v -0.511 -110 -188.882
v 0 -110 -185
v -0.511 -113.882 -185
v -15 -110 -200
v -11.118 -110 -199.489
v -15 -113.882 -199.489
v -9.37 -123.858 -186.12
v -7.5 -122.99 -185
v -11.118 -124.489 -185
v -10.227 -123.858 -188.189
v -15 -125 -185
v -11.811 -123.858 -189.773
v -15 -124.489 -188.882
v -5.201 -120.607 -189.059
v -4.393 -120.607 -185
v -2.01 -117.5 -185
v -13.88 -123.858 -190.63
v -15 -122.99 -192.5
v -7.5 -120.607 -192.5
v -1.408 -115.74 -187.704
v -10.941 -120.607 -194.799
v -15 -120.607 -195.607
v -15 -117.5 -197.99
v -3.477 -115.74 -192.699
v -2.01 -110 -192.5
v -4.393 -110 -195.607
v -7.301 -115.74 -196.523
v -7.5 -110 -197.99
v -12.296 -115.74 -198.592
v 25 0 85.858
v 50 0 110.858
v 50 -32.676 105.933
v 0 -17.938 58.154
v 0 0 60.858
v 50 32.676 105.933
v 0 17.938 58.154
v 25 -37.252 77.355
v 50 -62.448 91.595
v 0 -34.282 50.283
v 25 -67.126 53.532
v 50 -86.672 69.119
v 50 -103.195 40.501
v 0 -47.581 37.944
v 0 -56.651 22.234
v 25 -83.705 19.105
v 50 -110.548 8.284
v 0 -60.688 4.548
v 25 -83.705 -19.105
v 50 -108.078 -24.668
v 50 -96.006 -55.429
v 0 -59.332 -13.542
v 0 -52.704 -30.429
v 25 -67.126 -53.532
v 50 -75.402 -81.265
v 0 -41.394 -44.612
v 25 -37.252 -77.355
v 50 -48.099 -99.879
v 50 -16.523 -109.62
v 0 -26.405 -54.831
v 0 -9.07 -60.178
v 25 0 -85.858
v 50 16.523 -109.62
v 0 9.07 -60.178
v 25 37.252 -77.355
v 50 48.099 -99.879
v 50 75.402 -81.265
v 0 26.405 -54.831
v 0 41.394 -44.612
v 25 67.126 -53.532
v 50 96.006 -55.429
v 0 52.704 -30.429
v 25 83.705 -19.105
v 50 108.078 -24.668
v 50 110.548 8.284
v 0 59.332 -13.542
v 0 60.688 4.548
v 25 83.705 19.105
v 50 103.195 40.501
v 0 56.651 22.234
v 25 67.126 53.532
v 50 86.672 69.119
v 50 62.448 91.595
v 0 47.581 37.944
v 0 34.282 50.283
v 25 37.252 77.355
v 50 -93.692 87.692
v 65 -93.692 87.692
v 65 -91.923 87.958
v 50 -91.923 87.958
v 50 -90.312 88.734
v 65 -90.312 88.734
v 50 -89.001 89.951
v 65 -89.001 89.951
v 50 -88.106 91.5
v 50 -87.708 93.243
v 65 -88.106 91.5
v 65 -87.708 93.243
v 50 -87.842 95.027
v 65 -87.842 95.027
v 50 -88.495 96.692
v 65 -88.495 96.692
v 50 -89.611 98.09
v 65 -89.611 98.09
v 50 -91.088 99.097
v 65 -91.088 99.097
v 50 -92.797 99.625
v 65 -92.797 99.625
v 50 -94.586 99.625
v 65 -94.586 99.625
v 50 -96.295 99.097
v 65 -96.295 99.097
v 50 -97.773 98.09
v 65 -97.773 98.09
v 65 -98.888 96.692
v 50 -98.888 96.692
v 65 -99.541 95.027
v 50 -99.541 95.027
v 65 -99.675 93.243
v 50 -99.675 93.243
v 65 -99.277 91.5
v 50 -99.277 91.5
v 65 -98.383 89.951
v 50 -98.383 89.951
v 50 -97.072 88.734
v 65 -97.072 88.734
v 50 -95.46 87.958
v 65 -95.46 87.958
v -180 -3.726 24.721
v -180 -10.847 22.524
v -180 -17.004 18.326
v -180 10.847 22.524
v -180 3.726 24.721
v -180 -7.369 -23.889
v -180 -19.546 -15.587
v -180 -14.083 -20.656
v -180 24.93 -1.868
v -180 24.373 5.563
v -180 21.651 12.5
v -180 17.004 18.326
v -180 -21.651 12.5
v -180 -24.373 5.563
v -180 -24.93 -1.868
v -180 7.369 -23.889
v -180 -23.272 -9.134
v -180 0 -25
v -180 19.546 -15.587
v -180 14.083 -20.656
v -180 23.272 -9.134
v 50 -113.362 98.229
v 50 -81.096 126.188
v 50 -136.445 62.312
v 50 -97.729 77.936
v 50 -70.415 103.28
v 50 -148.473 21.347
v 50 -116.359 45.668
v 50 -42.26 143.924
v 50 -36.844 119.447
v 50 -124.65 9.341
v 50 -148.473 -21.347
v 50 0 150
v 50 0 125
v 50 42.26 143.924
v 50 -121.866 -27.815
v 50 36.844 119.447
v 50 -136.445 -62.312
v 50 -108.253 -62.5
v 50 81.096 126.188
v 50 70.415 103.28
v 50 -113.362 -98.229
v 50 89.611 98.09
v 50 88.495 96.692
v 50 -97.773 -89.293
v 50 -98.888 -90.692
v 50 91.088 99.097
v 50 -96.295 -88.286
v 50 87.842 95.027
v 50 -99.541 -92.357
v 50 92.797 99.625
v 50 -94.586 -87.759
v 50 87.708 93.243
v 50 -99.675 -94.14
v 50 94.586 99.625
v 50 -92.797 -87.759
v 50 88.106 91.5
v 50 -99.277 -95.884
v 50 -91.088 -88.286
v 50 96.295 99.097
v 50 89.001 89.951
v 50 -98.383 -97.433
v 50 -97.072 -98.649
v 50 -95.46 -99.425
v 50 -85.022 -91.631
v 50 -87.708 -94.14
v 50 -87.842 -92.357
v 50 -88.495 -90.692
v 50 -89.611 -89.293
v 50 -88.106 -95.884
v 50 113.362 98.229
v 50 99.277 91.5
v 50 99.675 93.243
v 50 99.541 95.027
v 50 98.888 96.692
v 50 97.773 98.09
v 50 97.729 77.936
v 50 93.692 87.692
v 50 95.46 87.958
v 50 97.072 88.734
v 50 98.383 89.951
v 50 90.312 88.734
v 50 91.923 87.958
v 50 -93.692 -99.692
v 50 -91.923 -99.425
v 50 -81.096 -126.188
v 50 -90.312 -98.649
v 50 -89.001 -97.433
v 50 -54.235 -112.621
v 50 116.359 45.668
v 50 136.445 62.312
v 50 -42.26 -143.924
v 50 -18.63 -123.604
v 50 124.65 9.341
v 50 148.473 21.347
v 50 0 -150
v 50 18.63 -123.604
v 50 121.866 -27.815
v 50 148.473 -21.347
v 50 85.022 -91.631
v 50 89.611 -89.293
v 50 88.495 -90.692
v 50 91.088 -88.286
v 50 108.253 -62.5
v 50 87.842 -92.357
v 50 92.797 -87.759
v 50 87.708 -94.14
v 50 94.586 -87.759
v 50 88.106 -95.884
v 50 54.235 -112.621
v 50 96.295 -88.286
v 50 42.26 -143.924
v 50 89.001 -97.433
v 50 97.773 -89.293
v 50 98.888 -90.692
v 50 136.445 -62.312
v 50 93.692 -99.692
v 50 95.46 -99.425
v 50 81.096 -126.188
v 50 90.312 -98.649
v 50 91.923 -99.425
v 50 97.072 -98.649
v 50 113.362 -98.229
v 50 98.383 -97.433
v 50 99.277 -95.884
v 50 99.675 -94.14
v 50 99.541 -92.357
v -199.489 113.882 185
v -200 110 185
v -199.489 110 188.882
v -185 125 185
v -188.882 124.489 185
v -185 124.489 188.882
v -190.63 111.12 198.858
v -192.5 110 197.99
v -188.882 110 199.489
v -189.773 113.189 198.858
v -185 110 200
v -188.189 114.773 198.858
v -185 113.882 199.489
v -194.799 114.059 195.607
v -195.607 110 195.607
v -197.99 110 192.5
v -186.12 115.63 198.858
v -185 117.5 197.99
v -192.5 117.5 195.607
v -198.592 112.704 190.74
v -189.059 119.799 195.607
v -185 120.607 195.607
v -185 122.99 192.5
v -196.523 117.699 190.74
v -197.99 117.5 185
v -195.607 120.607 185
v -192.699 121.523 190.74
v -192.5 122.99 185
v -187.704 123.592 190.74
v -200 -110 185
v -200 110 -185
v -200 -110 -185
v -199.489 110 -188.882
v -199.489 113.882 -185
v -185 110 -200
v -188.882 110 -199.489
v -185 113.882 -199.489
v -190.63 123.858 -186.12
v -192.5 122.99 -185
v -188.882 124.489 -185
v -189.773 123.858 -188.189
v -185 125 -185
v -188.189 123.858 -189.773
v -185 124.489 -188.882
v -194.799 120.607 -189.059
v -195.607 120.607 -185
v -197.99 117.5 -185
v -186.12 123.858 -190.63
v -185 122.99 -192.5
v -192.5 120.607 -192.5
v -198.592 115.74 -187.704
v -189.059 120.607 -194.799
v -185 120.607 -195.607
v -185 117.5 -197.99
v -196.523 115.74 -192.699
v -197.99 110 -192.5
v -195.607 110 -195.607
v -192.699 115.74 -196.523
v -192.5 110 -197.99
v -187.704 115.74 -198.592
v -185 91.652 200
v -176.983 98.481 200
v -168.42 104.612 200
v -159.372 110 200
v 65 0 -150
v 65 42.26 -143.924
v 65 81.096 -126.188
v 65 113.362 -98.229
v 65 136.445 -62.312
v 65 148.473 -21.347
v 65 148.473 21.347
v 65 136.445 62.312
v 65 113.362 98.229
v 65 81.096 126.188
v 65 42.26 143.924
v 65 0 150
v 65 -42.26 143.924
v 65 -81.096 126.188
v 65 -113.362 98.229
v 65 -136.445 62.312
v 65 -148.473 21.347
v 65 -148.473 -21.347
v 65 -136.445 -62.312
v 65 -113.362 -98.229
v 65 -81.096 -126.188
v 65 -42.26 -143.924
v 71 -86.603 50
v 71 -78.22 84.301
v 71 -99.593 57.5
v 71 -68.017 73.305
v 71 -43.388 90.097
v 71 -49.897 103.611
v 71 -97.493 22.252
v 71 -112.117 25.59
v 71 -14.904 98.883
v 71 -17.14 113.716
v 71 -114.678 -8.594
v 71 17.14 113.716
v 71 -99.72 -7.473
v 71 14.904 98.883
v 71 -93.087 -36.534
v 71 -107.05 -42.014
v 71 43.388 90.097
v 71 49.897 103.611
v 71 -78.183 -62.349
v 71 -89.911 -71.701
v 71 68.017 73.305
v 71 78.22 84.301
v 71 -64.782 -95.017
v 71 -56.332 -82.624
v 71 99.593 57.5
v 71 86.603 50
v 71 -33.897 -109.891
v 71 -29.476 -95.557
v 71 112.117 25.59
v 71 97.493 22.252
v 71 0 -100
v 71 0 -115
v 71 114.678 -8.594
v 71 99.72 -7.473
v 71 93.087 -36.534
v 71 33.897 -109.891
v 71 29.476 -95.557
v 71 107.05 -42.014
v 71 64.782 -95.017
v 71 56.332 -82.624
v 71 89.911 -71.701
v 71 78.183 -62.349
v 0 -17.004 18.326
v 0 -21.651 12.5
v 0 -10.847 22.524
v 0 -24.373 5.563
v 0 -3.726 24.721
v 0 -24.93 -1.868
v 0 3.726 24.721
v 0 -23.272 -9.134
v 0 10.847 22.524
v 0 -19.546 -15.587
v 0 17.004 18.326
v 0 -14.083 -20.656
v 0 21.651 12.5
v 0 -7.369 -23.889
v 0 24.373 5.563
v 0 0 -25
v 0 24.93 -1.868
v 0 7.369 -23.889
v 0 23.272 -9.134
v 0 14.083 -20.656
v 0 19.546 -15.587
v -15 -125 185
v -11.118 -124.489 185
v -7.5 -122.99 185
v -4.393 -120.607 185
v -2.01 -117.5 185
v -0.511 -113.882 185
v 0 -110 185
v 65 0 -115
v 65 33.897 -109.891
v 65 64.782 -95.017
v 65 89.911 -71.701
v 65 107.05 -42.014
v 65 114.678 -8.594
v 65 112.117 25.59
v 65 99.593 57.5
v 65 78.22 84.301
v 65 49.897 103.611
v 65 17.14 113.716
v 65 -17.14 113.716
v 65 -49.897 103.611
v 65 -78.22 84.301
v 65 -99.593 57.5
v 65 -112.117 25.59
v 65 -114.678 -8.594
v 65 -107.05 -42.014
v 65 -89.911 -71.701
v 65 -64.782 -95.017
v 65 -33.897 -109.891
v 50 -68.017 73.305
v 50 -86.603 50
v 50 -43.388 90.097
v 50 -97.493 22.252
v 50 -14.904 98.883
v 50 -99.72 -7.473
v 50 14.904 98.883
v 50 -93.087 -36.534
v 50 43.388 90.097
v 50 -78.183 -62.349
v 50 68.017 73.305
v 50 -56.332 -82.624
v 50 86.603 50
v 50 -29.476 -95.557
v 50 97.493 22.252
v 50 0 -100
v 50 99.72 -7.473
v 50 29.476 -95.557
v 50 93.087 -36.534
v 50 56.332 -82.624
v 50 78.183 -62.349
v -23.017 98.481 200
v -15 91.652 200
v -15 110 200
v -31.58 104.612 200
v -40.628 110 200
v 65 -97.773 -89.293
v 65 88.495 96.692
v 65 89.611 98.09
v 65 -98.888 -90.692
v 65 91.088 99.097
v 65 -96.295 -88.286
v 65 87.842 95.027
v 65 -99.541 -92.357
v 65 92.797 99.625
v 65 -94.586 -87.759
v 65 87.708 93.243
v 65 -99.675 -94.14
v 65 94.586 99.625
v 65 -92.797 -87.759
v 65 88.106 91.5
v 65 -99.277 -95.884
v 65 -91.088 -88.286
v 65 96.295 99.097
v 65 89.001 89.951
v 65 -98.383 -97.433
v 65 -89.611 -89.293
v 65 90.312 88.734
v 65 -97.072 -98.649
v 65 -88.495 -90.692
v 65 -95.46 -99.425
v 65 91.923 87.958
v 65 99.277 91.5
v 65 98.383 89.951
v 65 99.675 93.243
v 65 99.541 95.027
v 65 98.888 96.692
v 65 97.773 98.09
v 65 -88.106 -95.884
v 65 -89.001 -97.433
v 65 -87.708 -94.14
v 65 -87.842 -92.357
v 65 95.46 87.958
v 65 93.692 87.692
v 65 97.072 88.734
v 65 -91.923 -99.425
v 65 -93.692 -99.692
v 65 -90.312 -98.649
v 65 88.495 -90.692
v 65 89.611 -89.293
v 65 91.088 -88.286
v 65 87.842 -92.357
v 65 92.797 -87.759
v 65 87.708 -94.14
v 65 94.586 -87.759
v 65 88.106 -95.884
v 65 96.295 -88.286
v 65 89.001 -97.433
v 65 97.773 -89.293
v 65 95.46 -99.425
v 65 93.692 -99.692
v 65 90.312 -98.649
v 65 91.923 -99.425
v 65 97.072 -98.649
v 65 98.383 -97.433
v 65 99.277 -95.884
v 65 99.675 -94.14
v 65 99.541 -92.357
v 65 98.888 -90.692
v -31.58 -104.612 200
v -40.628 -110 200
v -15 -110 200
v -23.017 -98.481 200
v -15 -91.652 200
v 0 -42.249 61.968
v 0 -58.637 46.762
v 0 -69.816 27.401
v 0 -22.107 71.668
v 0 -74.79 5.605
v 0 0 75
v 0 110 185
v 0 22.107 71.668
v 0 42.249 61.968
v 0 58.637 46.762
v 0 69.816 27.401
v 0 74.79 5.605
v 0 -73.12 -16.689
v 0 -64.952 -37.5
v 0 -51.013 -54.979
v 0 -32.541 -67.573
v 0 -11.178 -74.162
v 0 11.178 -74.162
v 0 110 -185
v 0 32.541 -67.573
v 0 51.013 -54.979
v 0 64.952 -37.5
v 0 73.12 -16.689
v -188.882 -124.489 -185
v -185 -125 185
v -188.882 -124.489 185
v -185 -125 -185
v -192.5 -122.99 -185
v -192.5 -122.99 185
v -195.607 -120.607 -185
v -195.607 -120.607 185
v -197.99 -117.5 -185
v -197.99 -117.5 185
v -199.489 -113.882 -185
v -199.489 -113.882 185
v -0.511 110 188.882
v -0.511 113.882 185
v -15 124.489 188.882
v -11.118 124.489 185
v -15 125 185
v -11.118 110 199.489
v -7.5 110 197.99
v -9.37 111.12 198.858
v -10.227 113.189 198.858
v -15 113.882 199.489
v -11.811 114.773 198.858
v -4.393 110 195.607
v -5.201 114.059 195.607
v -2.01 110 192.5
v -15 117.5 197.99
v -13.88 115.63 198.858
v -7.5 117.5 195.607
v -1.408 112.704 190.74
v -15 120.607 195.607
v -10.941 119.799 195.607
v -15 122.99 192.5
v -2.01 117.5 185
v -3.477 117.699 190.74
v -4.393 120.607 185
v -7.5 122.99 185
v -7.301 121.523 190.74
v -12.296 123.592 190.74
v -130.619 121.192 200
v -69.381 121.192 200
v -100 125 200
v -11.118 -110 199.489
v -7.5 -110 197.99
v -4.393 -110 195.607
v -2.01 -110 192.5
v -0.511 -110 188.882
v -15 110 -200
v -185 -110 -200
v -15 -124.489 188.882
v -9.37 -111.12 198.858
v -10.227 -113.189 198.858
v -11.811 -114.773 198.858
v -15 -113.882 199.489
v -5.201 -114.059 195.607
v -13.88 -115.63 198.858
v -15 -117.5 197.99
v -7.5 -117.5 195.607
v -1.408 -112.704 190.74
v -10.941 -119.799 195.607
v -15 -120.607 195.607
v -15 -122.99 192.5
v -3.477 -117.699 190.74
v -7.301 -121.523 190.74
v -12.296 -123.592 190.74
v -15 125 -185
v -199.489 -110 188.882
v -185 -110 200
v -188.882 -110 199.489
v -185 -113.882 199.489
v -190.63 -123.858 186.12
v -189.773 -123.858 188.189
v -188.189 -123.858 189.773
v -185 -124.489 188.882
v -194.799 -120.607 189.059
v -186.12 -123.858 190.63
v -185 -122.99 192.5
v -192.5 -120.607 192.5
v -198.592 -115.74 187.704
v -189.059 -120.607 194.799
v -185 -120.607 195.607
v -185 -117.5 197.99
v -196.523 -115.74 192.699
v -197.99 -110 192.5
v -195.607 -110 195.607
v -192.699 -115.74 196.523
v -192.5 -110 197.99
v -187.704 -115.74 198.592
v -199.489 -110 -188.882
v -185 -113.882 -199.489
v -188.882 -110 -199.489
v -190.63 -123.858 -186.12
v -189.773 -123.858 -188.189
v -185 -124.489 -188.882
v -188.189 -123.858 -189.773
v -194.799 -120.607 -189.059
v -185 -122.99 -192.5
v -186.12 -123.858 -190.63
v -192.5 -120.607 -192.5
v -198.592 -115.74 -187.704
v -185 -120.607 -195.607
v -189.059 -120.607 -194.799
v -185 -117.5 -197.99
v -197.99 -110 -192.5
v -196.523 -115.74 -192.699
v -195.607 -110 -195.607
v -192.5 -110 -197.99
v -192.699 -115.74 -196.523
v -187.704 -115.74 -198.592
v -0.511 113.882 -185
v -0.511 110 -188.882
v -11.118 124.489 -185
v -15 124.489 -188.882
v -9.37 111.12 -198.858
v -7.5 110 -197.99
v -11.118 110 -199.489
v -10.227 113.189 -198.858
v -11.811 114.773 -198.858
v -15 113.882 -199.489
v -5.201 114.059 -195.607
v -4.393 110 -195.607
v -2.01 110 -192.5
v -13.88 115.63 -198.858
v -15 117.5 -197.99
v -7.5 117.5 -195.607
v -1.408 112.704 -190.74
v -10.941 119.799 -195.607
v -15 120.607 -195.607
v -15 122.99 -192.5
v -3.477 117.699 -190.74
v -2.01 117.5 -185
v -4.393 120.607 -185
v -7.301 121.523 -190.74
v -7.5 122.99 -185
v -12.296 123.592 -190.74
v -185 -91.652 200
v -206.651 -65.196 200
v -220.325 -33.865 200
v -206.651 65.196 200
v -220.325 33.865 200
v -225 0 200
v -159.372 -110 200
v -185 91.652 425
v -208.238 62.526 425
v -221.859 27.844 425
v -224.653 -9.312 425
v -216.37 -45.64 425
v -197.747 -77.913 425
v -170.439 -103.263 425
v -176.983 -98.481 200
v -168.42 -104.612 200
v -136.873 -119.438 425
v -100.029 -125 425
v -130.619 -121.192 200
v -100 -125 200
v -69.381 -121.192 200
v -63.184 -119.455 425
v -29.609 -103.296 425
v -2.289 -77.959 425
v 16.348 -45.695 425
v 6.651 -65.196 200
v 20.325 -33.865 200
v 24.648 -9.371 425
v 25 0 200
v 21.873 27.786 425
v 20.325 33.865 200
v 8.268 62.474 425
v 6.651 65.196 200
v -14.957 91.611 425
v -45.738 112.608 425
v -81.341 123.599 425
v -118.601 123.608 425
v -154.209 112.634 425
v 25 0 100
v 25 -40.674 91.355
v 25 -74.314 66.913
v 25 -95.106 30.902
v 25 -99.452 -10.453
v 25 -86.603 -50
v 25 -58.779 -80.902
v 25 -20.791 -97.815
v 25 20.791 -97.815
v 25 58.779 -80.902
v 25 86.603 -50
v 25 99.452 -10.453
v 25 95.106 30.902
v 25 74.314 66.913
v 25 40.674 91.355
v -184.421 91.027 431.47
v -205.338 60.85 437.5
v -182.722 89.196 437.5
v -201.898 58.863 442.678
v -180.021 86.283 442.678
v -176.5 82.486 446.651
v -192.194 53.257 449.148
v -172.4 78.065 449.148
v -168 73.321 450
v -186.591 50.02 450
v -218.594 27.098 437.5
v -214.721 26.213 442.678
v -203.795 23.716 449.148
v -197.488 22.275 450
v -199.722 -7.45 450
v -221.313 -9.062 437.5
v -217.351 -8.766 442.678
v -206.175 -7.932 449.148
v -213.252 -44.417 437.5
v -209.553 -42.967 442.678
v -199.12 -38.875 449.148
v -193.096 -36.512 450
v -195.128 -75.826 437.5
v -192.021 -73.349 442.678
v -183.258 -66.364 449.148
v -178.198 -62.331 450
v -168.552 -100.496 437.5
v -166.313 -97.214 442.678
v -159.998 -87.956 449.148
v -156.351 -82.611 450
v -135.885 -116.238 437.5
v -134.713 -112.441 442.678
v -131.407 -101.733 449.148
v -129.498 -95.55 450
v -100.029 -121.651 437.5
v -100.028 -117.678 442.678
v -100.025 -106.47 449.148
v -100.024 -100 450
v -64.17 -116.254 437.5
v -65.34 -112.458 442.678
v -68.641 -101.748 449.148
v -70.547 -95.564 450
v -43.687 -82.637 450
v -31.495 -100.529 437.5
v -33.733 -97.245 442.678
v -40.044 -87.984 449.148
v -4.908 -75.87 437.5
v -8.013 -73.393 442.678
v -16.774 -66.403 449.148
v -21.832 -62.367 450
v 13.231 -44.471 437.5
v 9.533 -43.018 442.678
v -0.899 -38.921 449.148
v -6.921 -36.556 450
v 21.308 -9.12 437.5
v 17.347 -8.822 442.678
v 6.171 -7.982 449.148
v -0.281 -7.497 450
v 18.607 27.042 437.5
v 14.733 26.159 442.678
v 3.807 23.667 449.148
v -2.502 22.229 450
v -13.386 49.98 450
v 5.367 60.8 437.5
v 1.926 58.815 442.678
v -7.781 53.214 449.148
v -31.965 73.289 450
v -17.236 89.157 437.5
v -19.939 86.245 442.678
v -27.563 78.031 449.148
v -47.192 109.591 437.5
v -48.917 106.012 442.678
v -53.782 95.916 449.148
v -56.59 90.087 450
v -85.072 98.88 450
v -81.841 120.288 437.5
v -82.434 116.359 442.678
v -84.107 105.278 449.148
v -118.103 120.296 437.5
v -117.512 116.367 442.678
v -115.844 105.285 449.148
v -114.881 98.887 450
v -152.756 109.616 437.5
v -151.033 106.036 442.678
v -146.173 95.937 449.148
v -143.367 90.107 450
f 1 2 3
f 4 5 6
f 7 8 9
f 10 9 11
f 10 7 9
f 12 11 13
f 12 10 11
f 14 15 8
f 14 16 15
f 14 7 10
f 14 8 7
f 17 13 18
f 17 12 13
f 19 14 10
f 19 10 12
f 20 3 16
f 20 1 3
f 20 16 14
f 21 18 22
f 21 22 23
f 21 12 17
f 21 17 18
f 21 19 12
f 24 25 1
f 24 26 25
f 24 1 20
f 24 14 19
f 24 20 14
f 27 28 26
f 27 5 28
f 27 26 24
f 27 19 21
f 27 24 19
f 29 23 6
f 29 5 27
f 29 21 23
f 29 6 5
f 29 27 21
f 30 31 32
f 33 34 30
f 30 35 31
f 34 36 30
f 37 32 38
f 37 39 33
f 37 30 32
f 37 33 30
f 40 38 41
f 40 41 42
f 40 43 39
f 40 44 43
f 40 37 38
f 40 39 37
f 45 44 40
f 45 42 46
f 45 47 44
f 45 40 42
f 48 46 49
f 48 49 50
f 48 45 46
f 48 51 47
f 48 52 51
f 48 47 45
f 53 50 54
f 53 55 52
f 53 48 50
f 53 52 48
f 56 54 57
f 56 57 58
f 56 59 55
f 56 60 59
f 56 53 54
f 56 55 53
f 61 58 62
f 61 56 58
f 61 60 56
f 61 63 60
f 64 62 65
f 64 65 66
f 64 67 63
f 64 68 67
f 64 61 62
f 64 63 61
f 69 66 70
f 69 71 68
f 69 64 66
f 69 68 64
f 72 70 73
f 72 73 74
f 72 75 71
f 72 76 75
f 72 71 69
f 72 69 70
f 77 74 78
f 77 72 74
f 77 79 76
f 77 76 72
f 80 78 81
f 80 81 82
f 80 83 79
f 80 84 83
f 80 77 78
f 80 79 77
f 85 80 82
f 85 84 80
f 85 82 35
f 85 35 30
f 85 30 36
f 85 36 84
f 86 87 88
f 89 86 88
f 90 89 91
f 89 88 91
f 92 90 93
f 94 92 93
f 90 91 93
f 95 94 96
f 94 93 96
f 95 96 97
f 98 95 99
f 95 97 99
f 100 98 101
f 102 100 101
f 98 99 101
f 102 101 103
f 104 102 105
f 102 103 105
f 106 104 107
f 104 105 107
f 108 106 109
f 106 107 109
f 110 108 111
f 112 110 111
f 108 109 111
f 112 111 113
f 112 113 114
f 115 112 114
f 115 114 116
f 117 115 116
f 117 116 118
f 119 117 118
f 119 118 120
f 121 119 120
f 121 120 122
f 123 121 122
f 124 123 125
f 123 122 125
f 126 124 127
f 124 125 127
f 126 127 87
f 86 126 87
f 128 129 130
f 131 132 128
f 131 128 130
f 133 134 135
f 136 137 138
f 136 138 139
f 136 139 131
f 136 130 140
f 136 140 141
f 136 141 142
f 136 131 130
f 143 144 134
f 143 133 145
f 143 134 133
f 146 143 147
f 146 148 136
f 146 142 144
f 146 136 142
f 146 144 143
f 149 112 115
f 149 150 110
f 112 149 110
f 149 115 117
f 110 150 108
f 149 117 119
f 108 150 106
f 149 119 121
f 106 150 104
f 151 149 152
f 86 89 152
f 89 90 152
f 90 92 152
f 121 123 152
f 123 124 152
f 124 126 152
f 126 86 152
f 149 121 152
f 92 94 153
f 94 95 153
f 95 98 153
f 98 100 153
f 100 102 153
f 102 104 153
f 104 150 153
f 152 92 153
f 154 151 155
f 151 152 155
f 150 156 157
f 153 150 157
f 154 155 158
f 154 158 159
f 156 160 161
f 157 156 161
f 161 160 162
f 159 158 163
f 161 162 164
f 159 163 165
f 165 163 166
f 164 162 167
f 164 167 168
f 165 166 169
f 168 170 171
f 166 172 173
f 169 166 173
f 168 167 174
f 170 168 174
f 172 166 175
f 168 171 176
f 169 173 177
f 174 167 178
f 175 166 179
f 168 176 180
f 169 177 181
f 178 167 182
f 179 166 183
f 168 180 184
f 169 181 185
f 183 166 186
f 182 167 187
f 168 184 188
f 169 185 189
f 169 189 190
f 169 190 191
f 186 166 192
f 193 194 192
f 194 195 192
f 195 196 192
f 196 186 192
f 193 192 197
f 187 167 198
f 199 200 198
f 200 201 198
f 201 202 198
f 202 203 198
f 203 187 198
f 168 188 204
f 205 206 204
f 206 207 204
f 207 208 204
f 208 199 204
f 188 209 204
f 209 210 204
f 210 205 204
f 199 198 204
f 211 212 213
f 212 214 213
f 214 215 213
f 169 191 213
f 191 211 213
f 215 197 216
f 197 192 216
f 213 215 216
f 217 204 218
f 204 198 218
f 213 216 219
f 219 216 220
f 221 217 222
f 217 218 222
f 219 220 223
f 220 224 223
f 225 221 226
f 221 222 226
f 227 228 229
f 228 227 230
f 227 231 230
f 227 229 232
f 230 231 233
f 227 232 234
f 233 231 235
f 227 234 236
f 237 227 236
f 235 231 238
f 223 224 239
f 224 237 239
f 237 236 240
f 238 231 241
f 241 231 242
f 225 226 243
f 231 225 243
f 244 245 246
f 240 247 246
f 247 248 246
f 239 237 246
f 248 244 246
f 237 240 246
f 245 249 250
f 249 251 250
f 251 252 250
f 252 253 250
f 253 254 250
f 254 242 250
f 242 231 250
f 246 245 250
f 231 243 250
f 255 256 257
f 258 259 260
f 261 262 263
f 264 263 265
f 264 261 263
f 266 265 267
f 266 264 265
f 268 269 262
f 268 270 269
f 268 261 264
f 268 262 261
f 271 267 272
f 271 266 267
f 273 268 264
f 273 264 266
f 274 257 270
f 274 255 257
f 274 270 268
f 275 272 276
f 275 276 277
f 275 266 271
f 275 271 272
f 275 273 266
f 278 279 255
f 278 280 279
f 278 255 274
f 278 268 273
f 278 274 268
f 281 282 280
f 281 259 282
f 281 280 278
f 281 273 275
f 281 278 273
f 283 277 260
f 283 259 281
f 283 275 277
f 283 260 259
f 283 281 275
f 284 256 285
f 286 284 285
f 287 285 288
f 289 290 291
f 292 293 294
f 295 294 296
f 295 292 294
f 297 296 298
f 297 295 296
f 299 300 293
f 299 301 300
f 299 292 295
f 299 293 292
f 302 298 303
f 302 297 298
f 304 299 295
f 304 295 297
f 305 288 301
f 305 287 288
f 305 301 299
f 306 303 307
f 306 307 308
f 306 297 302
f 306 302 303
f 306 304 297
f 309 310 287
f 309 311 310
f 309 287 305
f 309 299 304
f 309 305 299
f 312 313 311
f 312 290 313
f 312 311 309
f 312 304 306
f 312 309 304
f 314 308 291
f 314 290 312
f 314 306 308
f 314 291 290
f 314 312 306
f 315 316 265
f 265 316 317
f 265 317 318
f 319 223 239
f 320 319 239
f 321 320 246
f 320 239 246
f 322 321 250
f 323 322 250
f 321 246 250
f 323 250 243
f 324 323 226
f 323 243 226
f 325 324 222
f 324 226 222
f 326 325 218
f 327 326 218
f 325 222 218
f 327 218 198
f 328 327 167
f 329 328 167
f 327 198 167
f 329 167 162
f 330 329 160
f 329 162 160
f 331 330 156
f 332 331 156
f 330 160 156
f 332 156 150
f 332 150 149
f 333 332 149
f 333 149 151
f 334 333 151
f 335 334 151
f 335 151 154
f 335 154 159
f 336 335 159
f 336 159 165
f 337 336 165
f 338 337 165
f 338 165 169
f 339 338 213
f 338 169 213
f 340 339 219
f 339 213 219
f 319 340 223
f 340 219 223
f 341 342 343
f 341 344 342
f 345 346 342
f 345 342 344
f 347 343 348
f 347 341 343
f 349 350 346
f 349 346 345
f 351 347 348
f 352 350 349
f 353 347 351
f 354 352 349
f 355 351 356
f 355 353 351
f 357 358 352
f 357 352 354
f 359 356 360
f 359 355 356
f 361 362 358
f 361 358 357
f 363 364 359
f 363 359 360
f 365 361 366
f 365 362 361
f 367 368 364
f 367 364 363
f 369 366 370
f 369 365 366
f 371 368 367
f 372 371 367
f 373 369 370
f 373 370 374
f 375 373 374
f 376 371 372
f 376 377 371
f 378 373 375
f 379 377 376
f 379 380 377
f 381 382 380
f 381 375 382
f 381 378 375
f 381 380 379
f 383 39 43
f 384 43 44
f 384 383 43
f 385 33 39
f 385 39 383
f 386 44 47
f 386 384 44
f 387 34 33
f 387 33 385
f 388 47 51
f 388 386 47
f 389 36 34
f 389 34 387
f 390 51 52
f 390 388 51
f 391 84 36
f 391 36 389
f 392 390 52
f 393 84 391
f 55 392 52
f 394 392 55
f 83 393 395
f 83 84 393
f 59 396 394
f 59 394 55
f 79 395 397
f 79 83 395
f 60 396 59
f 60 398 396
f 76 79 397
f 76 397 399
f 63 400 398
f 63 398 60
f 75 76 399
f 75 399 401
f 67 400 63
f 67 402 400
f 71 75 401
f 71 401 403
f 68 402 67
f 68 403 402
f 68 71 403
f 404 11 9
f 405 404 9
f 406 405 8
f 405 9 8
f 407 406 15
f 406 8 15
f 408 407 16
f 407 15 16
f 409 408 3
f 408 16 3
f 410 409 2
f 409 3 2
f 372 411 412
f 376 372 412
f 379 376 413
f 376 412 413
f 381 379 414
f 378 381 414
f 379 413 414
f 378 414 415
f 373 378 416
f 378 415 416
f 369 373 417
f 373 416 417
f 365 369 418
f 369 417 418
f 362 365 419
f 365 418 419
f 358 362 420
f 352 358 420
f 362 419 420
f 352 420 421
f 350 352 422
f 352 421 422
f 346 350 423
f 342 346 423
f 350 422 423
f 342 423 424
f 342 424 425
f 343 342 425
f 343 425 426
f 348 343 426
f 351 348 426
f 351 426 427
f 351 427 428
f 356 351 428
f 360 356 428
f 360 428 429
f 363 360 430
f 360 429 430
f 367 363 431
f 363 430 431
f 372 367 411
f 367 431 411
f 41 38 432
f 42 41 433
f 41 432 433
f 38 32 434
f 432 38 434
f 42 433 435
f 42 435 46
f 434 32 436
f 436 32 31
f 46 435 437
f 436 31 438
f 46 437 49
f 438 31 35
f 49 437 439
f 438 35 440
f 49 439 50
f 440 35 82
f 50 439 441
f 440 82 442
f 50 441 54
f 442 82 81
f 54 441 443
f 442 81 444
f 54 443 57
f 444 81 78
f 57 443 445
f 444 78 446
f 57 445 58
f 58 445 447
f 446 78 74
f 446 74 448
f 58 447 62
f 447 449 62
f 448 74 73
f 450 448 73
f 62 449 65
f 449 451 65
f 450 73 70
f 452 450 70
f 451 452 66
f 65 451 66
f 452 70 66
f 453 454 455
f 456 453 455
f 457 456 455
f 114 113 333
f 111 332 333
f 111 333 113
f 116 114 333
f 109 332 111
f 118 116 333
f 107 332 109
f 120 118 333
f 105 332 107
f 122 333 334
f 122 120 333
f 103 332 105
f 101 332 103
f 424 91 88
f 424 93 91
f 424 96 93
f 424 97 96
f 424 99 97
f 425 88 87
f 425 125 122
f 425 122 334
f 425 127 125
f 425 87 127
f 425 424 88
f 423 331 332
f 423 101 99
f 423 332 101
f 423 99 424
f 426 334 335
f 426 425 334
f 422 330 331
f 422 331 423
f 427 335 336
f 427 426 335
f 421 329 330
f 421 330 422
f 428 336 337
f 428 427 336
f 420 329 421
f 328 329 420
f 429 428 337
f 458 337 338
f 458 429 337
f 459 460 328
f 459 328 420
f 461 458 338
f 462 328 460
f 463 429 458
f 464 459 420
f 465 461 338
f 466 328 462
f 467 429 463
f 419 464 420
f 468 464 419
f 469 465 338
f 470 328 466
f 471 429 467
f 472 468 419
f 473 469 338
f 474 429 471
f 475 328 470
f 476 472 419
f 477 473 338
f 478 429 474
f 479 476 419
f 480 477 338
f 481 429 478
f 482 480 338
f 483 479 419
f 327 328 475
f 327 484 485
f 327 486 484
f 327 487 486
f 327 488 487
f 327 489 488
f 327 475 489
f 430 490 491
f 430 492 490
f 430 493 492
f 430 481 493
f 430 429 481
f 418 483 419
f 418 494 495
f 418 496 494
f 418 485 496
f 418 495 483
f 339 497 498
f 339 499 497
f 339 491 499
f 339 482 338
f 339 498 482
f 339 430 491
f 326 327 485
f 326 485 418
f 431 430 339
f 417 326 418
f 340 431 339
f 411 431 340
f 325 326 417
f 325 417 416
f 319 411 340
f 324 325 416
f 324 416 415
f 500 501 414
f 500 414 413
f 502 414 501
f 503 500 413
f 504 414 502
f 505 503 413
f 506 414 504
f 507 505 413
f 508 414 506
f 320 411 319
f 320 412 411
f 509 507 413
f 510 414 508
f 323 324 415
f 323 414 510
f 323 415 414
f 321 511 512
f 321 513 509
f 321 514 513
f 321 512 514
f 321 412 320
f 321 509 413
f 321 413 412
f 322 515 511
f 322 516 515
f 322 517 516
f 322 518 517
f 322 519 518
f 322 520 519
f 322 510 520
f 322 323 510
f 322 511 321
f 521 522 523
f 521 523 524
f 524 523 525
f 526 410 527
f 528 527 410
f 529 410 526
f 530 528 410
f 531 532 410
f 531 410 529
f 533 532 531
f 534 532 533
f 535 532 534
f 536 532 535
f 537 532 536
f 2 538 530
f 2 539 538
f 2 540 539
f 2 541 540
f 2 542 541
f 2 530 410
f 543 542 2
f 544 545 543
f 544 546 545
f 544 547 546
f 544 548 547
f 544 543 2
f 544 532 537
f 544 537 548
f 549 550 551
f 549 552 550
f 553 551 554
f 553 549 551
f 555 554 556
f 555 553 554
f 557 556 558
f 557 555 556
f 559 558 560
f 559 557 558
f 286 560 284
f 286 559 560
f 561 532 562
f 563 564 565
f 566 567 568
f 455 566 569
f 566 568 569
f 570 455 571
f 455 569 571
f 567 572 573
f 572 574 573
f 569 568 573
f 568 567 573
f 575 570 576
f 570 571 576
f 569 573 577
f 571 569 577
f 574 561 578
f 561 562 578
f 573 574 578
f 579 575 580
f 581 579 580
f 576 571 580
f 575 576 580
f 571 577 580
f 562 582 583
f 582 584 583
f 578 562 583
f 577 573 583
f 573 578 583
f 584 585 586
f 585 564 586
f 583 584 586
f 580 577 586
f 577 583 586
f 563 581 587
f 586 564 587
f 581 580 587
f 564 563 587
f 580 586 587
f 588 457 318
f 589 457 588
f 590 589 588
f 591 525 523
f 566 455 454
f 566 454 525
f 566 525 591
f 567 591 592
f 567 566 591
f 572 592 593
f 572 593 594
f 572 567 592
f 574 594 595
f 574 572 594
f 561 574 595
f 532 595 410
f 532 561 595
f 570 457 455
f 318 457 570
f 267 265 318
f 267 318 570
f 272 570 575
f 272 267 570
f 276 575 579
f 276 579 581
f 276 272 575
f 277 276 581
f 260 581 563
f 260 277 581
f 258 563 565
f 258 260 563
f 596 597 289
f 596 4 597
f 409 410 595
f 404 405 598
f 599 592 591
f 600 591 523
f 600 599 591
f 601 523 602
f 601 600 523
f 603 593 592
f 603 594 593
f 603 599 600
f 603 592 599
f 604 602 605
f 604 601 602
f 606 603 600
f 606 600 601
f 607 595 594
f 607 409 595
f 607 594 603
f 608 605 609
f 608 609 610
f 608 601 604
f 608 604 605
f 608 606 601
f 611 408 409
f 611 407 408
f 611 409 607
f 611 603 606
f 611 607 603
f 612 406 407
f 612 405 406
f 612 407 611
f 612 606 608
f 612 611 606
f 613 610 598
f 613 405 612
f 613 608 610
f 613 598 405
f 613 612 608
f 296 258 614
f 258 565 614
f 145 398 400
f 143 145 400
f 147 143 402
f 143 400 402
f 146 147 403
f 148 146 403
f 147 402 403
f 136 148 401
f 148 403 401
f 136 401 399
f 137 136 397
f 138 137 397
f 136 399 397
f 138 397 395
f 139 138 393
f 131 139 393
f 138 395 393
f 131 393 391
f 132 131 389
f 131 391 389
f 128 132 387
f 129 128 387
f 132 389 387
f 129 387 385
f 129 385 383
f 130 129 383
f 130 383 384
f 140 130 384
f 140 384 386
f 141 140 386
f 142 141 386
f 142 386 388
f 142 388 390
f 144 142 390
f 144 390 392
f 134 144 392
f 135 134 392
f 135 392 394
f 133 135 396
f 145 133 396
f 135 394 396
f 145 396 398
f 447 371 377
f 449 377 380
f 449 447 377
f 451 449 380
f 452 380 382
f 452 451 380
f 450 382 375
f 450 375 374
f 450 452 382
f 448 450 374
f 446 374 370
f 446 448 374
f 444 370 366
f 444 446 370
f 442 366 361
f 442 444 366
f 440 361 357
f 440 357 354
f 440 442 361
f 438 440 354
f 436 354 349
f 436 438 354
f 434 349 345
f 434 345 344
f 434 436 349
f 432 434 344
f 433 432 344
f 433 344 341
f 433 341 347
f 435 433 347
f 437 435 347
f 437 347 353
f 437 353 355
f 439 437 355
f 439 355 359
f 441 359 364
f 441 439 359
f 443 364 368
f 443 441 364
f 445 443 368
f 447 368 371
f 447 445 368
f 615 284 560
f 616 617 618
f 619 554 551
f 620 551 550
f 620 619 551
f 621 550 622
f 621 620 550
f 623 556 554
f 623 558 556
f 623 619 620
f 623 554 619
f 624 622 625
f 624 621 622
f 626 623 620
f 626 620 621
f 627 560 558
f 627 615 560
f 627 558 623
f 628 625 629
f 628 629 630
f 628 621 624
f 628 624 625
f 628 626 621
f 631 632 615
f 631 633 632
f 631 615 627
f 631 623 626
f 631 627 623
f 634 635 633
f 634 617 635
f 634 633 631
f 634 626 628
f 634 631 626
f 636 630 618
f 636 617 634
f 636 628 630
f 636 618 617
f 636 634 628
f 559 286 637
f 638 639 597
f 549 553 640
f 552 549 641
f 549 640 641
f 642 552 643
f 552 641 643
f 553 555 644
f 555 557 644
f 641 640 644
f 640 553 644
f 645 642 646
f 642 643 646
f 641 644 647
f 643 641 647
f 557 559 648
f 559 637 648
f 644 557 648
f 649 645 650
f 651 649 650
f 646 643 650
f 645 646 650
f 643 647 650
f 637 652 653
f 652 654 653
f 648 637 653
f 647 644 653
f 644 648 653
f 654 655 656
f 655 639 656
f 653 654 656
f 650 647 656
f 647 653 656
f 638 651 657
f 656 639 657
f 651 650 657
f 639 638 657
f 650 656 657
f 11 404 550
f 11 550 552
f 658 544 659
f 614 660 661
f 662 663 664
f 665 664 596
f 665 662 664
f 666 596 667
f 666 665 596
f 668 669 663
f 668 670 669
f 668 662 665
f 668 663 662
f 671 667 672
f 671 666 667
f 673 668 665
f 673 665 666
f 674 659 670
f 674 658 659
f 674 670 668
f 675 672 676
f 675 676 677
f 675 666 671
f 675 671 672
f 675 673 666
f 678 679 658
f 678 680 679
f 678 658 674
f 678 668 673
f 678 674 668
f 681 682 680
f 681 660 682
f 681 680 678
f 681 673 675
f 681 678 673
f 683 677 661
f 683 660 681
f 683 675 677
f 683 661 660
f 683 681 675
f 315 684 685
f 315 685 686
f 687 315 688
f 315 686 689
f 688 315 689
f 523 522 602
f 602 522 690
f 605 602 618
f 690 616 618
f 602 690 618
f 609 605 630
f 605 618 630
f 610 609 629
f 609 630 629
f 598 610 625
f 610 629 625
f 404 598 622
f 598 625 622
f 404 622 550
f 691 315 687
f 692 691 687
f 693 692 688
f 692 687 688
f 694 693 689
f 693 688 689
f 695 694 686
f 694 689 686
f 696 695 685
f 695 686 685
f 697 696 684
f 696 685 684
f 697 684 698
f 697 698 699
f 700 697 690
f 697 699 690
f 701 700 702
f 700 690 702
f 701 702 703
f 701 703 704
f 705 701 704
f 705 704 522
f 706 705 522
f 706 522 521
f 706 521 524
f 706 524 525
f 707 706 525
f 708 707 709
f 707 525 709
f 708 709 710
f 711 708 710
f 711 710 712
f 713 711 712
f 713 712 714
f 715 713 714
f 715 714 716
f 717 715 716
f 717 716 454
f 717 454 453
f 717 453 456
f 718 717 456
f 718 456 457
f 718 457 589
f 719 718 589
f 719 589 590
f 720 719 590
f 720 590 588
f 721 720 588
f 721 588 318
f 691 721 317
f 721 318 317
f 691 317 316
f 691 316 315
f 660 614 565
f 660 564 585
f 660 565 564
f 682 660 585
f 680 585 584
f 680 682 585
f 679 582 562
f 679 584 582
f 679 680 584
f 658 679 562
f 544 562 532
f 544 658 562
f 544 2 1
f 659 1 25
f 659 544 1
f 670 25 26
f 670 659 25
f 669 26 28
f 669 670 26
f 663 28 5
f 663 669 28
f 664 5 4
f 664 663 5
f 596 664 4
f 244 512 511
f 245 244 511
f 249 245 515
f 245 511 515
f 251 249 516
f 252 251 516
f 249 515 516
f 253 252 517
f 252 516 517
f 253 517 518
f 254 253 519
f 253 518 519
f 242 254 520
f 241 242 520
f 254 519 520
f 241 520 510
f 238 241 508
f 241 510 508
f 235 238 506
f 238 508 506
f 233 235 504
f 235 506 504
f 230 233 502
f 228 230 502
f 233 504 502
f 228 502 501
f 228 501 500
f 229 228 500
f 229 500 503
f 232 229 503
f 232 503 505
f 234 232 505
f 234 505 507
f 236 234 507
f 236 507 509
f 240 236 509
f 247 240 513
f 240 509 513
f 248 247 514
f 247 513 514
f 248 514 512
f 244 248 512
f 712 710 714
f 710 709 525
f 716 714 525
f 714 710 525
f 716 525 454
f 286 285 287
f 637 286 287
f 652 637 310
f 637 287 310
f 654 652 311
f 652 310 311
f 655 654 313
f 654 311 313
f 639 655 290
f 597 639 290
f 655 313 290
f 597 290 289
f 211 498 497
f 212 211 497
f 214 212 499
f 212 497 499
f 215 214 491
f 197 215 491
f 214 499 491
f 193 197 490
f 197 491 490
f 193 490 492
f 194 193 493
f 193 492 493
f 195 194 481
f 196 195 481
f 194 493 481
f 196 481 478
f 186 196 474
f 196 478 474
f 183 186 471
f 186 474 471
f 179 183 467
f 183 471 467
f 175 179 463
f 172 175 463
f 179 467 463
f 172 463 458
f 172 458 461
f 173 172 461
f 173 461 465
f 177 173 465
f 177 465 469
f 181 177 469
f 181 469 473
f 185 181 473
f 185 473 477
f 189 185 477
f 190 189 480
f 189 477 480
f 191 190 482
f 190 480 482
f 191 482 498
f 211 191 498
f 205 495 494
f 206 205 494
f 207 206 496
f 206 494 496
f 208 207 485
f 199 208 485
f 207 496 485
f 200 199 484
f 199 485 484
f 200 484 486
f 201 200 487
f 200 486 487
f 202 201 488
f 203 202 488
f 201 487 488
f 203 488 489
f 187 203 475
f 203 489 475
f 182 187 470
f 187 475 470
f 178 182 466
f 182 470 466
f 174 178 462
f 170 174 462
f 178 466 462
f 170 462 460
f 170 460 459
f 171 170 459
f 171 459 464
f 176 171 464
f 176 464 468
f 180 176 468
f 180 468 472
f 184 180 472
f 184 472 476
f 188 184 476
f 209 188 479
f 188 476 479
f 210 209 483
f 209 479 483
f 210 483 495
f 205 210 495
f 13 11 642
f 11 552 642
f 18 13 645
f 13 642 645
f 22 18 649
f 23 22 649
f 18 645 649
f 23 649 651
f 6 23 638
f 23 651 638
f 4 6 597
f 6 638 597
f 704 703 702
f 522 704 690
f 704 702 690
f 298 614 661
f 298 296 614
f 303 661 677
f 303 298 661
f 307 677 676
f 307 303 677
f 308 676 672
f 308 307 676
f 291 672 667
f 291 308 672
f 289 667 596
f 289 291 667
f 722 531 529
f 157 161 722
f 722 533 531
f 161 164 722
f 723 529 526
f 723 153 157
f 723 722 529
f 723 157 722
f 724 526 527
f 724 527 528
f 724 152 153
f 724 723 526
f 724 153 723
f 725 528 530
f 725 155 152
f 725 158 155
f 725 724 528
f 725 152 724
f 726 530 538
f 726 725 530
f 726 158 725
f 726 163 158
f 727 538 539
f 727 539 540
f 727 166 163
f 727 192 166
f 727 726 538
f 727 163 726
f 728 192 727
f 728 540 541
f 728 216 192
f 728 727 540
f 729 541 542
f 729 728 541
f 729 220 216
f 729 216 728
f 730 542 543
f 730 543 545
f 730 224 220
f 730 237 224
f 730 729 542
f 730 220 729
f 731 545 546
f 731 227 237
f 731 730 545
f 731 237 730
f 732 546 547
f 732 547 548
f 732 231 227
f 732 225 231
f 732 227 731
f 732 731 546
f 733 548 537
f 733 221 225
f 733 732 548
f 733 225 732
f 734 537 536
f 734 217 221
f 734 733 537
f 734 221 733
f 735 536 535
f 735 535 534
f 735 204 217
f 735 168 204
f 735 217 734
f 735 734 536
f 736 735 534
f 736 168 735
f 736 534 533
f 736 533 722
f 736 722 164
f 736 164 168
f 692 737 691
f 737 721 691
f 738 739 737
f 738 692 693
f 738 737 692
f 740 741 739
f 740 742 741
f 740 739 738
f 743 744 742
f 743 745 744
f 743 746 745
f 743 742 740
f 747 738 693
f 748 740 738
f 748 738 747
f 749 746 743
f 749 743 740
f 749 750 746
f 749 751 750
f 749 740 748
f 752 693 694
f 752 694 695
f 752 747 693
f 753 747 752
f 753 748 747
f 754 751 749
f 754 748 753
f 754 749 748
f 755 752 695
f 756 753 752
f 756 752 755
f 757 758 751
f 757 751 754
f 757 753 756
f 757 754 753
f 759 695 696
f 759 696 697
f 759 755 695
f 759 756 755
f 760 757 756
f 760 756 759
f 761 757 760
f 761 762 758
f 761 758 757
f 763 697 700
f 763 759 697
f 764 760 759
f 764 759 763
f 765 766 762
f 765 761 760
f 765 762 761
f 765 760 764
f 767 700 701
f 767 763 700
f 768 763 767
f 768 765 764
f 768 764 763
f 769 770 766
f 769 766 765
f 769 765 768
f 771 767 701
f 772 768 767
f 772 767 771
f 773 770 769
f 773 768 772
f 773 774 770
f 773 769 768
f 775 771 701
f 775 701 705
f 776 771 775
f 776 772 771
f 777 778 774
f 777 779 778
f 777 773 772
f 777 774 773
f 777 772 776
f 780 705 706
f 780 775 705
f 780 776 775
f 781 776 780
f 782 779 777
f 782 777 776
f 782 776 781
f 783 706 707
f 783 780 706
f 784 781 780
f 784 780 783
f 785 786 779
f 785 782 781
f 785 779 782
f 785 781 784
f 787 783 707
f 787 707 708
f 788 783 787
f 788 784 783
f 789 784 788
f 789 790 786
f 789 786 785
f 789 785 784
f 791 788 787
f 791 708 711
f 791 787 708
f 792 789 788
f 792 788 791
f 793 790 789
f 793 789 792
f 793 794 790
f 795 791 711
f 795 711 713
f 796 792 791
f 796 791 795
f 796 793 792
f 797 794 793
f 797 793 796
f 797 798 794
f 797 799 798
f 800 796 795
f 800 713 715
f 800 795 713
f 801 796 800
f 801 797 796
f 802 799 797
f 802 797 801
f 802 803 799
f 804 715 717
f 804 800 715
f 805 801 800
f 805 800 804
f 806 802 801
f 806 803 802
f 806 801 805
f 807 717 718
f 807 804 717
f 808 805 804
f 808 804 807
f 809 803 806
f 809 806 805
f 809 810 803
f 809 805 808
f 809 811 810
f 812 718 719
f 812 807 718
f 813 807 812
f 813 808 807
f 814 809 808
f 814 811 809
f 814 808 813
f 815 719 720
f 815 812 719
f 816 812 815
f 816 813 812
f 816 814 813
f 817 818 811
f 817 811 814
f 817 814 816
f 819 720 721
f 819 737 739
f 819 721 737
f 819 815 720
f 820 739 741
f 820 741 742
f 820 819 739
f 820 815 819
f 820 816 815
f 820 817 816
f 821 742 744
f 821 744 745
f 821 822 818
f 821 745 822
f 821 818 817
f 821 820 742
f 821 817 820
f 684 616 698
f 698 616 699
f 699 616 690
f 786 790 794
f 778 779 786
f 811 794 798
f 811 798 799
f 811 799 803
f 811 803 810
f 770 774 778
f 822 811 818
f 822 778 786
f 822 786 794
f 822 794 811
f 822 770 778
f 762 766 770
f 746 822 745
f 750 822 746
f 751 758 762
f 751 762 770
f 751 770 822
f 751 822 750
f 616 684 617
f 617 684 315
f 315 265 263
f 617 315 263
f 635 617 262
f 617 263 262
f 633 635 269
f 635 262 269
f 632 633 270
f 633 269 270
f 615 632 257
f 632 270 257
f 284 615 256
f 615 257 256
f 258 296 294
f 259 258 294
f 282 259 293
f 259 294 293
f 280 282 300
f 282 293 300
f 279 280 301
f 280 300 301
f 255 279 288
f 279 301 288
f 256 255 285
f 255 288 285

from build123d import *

# Parameters (mm, degrees)
SKETCH_4_W          = 400
SKETCH_4_H          = 250
EXTRUDE_4_DEPTH     = 200
SKETCH_10_R         = 25
CUT_EXTRUDE_1_DEPTH = 180
FILLET_3_R          = 15
SKETCH_9_R          = 125
EXTRUDE_8_DEPTH     = 250
FILLET_4_R          = 25
SKETCH_5_R          = 150
SKETCH_5_R_2        = 100
EXTRUDE_5_DEPTH     = 15
SKETCH_6_R          = 115
SKETCH_6_R_2        = 100
EXTRUDE_6_DEPTH     = 6
SKETCH_13_R         = 6
CUT_EXTRUDE_2_DEPTH = 15


with BuildPart() as part:
    # 草图4 → 凸台-拉伸4 (new body)
    with BuildSketch(Plane(origin=(0, 0, 0), x_dir=(0, 0, -1), z_dir=(1, 0, 0))):
        Rectangle(SKETCH_4_W, SKETCH_4_H)
    extrude(amount=-EXTRUDE_4_DEPTH)

    # 草图10 → 切除-拉伸1 (cut)
    with BuildSketch(Plane(origin=(0, 0, 0), x_dir=(0, 0, -1), z_dir=(1, 0, 0))):
        Circle(SKETCH_10_R)
    extrude(amount=-CUT_EXTRUDE_1_DEPTH, mode=Mode.SUBTRACT)

    # 圆角3
    fillet_3_edges = [part.edges().sort_by_distance(p)[0] for p in [
        (-200, 0, -200),
        (-200, 125, 0),
        (-200, 0, 200),
        (0, 125, 0),
        (0, 0, -200),
        (0, -125, 0),
        (0, 0, 200),
        (-200, -125, 0),
        (-100, 125, 200),
        (-100, 125, -200),
        (-100, -125, -200),
        (-100, -125, 200),
    ]]
    fillet(fillet_3_edges, radius=FILLET_3_R)

    # 草图9 → 凸台-拉伸8 (add)
    with BuildSketch(Plane.XY.offset(200)):
        with Locations(Location((-100, 0, 0), (0, 0, 132.843643044))):
            Circle(SKETCH_9_R)
    extrude(amount=EXTRUDE_8_DEPTH)

    # 圆角4
    fillet_4_edges = [part.edges().sort_by_distance(p)[0] for p in [
        (-14.999999999, -91.651513899, 450),
    ]]
    fillet(fillet_4_edges, radius=FILLET_4_R)

    # 草图12 → 旋转1 (revolve)
    with BuildSketch(Plane.XY, mode=Mode.PRIVATE) as revolve_1_sk:
        Polygon((0, 75), (50, 125), (50, 110.857864376), (0, 60.857864376), align=None)
    revolve(revolve_1_sk.sketch.rotate(Axis((-1000, 0, 0), (1, 0, 0)), 90), axis=Axis((-1000, 0, 0), (1, 0, 0)))

    # 草图5 → 凸台-拉伸5 (add)
    with BuildSketch(Plane(origin=(50, 0, 0), x_dir=(0, 0, -1), z_dir=(1, 0, 0))):
        Circle(SKETCH_5_R)
        Circle(SKETCH_5_R_2, mode=Mode.SUBTRACT)
    extrude(amount=EXTRUDE_5_DEPTH)

    # 草图6 → 凸台-拉伸6 (add)
    with BuildSketch(Plane(origin=(65, 0, 0), x_dir=(0, 0, -1), z_dir=(1, 0, 0))):
        Circle(SKETCH_6_R)
        Circle(SKETCH_6_R_2, mode=Mode.SUBTRACT)
    extrude(amount=EXTRUDE_6_DEPTH)

    # 草图13 → 切除-拉伸2 (cut)
    with BuildSketch(Plane(origin=(65, 0, 0), x_dir=(0, 0, -1), z_dir=(1, 0, 0))):
        with Locations((93.691648507, 93.691648507)):
            Circle(SKETCH_13_R)
        with Locations((-93.691648507, -93.691648507)):
            Circle(SKETCH_13_R)
        with Locations((-93.691648507, 93.691648507)):
            Circle(SKETCH_13_R)
        with Locations((93.691648507, -93.691648507)):
            Circle(SKETCH_13_R)
    extrude(amount=-CUT_EXTRUDE_2_DEPTH, mode=Mode.SUBTRACT)


solid = part.part
